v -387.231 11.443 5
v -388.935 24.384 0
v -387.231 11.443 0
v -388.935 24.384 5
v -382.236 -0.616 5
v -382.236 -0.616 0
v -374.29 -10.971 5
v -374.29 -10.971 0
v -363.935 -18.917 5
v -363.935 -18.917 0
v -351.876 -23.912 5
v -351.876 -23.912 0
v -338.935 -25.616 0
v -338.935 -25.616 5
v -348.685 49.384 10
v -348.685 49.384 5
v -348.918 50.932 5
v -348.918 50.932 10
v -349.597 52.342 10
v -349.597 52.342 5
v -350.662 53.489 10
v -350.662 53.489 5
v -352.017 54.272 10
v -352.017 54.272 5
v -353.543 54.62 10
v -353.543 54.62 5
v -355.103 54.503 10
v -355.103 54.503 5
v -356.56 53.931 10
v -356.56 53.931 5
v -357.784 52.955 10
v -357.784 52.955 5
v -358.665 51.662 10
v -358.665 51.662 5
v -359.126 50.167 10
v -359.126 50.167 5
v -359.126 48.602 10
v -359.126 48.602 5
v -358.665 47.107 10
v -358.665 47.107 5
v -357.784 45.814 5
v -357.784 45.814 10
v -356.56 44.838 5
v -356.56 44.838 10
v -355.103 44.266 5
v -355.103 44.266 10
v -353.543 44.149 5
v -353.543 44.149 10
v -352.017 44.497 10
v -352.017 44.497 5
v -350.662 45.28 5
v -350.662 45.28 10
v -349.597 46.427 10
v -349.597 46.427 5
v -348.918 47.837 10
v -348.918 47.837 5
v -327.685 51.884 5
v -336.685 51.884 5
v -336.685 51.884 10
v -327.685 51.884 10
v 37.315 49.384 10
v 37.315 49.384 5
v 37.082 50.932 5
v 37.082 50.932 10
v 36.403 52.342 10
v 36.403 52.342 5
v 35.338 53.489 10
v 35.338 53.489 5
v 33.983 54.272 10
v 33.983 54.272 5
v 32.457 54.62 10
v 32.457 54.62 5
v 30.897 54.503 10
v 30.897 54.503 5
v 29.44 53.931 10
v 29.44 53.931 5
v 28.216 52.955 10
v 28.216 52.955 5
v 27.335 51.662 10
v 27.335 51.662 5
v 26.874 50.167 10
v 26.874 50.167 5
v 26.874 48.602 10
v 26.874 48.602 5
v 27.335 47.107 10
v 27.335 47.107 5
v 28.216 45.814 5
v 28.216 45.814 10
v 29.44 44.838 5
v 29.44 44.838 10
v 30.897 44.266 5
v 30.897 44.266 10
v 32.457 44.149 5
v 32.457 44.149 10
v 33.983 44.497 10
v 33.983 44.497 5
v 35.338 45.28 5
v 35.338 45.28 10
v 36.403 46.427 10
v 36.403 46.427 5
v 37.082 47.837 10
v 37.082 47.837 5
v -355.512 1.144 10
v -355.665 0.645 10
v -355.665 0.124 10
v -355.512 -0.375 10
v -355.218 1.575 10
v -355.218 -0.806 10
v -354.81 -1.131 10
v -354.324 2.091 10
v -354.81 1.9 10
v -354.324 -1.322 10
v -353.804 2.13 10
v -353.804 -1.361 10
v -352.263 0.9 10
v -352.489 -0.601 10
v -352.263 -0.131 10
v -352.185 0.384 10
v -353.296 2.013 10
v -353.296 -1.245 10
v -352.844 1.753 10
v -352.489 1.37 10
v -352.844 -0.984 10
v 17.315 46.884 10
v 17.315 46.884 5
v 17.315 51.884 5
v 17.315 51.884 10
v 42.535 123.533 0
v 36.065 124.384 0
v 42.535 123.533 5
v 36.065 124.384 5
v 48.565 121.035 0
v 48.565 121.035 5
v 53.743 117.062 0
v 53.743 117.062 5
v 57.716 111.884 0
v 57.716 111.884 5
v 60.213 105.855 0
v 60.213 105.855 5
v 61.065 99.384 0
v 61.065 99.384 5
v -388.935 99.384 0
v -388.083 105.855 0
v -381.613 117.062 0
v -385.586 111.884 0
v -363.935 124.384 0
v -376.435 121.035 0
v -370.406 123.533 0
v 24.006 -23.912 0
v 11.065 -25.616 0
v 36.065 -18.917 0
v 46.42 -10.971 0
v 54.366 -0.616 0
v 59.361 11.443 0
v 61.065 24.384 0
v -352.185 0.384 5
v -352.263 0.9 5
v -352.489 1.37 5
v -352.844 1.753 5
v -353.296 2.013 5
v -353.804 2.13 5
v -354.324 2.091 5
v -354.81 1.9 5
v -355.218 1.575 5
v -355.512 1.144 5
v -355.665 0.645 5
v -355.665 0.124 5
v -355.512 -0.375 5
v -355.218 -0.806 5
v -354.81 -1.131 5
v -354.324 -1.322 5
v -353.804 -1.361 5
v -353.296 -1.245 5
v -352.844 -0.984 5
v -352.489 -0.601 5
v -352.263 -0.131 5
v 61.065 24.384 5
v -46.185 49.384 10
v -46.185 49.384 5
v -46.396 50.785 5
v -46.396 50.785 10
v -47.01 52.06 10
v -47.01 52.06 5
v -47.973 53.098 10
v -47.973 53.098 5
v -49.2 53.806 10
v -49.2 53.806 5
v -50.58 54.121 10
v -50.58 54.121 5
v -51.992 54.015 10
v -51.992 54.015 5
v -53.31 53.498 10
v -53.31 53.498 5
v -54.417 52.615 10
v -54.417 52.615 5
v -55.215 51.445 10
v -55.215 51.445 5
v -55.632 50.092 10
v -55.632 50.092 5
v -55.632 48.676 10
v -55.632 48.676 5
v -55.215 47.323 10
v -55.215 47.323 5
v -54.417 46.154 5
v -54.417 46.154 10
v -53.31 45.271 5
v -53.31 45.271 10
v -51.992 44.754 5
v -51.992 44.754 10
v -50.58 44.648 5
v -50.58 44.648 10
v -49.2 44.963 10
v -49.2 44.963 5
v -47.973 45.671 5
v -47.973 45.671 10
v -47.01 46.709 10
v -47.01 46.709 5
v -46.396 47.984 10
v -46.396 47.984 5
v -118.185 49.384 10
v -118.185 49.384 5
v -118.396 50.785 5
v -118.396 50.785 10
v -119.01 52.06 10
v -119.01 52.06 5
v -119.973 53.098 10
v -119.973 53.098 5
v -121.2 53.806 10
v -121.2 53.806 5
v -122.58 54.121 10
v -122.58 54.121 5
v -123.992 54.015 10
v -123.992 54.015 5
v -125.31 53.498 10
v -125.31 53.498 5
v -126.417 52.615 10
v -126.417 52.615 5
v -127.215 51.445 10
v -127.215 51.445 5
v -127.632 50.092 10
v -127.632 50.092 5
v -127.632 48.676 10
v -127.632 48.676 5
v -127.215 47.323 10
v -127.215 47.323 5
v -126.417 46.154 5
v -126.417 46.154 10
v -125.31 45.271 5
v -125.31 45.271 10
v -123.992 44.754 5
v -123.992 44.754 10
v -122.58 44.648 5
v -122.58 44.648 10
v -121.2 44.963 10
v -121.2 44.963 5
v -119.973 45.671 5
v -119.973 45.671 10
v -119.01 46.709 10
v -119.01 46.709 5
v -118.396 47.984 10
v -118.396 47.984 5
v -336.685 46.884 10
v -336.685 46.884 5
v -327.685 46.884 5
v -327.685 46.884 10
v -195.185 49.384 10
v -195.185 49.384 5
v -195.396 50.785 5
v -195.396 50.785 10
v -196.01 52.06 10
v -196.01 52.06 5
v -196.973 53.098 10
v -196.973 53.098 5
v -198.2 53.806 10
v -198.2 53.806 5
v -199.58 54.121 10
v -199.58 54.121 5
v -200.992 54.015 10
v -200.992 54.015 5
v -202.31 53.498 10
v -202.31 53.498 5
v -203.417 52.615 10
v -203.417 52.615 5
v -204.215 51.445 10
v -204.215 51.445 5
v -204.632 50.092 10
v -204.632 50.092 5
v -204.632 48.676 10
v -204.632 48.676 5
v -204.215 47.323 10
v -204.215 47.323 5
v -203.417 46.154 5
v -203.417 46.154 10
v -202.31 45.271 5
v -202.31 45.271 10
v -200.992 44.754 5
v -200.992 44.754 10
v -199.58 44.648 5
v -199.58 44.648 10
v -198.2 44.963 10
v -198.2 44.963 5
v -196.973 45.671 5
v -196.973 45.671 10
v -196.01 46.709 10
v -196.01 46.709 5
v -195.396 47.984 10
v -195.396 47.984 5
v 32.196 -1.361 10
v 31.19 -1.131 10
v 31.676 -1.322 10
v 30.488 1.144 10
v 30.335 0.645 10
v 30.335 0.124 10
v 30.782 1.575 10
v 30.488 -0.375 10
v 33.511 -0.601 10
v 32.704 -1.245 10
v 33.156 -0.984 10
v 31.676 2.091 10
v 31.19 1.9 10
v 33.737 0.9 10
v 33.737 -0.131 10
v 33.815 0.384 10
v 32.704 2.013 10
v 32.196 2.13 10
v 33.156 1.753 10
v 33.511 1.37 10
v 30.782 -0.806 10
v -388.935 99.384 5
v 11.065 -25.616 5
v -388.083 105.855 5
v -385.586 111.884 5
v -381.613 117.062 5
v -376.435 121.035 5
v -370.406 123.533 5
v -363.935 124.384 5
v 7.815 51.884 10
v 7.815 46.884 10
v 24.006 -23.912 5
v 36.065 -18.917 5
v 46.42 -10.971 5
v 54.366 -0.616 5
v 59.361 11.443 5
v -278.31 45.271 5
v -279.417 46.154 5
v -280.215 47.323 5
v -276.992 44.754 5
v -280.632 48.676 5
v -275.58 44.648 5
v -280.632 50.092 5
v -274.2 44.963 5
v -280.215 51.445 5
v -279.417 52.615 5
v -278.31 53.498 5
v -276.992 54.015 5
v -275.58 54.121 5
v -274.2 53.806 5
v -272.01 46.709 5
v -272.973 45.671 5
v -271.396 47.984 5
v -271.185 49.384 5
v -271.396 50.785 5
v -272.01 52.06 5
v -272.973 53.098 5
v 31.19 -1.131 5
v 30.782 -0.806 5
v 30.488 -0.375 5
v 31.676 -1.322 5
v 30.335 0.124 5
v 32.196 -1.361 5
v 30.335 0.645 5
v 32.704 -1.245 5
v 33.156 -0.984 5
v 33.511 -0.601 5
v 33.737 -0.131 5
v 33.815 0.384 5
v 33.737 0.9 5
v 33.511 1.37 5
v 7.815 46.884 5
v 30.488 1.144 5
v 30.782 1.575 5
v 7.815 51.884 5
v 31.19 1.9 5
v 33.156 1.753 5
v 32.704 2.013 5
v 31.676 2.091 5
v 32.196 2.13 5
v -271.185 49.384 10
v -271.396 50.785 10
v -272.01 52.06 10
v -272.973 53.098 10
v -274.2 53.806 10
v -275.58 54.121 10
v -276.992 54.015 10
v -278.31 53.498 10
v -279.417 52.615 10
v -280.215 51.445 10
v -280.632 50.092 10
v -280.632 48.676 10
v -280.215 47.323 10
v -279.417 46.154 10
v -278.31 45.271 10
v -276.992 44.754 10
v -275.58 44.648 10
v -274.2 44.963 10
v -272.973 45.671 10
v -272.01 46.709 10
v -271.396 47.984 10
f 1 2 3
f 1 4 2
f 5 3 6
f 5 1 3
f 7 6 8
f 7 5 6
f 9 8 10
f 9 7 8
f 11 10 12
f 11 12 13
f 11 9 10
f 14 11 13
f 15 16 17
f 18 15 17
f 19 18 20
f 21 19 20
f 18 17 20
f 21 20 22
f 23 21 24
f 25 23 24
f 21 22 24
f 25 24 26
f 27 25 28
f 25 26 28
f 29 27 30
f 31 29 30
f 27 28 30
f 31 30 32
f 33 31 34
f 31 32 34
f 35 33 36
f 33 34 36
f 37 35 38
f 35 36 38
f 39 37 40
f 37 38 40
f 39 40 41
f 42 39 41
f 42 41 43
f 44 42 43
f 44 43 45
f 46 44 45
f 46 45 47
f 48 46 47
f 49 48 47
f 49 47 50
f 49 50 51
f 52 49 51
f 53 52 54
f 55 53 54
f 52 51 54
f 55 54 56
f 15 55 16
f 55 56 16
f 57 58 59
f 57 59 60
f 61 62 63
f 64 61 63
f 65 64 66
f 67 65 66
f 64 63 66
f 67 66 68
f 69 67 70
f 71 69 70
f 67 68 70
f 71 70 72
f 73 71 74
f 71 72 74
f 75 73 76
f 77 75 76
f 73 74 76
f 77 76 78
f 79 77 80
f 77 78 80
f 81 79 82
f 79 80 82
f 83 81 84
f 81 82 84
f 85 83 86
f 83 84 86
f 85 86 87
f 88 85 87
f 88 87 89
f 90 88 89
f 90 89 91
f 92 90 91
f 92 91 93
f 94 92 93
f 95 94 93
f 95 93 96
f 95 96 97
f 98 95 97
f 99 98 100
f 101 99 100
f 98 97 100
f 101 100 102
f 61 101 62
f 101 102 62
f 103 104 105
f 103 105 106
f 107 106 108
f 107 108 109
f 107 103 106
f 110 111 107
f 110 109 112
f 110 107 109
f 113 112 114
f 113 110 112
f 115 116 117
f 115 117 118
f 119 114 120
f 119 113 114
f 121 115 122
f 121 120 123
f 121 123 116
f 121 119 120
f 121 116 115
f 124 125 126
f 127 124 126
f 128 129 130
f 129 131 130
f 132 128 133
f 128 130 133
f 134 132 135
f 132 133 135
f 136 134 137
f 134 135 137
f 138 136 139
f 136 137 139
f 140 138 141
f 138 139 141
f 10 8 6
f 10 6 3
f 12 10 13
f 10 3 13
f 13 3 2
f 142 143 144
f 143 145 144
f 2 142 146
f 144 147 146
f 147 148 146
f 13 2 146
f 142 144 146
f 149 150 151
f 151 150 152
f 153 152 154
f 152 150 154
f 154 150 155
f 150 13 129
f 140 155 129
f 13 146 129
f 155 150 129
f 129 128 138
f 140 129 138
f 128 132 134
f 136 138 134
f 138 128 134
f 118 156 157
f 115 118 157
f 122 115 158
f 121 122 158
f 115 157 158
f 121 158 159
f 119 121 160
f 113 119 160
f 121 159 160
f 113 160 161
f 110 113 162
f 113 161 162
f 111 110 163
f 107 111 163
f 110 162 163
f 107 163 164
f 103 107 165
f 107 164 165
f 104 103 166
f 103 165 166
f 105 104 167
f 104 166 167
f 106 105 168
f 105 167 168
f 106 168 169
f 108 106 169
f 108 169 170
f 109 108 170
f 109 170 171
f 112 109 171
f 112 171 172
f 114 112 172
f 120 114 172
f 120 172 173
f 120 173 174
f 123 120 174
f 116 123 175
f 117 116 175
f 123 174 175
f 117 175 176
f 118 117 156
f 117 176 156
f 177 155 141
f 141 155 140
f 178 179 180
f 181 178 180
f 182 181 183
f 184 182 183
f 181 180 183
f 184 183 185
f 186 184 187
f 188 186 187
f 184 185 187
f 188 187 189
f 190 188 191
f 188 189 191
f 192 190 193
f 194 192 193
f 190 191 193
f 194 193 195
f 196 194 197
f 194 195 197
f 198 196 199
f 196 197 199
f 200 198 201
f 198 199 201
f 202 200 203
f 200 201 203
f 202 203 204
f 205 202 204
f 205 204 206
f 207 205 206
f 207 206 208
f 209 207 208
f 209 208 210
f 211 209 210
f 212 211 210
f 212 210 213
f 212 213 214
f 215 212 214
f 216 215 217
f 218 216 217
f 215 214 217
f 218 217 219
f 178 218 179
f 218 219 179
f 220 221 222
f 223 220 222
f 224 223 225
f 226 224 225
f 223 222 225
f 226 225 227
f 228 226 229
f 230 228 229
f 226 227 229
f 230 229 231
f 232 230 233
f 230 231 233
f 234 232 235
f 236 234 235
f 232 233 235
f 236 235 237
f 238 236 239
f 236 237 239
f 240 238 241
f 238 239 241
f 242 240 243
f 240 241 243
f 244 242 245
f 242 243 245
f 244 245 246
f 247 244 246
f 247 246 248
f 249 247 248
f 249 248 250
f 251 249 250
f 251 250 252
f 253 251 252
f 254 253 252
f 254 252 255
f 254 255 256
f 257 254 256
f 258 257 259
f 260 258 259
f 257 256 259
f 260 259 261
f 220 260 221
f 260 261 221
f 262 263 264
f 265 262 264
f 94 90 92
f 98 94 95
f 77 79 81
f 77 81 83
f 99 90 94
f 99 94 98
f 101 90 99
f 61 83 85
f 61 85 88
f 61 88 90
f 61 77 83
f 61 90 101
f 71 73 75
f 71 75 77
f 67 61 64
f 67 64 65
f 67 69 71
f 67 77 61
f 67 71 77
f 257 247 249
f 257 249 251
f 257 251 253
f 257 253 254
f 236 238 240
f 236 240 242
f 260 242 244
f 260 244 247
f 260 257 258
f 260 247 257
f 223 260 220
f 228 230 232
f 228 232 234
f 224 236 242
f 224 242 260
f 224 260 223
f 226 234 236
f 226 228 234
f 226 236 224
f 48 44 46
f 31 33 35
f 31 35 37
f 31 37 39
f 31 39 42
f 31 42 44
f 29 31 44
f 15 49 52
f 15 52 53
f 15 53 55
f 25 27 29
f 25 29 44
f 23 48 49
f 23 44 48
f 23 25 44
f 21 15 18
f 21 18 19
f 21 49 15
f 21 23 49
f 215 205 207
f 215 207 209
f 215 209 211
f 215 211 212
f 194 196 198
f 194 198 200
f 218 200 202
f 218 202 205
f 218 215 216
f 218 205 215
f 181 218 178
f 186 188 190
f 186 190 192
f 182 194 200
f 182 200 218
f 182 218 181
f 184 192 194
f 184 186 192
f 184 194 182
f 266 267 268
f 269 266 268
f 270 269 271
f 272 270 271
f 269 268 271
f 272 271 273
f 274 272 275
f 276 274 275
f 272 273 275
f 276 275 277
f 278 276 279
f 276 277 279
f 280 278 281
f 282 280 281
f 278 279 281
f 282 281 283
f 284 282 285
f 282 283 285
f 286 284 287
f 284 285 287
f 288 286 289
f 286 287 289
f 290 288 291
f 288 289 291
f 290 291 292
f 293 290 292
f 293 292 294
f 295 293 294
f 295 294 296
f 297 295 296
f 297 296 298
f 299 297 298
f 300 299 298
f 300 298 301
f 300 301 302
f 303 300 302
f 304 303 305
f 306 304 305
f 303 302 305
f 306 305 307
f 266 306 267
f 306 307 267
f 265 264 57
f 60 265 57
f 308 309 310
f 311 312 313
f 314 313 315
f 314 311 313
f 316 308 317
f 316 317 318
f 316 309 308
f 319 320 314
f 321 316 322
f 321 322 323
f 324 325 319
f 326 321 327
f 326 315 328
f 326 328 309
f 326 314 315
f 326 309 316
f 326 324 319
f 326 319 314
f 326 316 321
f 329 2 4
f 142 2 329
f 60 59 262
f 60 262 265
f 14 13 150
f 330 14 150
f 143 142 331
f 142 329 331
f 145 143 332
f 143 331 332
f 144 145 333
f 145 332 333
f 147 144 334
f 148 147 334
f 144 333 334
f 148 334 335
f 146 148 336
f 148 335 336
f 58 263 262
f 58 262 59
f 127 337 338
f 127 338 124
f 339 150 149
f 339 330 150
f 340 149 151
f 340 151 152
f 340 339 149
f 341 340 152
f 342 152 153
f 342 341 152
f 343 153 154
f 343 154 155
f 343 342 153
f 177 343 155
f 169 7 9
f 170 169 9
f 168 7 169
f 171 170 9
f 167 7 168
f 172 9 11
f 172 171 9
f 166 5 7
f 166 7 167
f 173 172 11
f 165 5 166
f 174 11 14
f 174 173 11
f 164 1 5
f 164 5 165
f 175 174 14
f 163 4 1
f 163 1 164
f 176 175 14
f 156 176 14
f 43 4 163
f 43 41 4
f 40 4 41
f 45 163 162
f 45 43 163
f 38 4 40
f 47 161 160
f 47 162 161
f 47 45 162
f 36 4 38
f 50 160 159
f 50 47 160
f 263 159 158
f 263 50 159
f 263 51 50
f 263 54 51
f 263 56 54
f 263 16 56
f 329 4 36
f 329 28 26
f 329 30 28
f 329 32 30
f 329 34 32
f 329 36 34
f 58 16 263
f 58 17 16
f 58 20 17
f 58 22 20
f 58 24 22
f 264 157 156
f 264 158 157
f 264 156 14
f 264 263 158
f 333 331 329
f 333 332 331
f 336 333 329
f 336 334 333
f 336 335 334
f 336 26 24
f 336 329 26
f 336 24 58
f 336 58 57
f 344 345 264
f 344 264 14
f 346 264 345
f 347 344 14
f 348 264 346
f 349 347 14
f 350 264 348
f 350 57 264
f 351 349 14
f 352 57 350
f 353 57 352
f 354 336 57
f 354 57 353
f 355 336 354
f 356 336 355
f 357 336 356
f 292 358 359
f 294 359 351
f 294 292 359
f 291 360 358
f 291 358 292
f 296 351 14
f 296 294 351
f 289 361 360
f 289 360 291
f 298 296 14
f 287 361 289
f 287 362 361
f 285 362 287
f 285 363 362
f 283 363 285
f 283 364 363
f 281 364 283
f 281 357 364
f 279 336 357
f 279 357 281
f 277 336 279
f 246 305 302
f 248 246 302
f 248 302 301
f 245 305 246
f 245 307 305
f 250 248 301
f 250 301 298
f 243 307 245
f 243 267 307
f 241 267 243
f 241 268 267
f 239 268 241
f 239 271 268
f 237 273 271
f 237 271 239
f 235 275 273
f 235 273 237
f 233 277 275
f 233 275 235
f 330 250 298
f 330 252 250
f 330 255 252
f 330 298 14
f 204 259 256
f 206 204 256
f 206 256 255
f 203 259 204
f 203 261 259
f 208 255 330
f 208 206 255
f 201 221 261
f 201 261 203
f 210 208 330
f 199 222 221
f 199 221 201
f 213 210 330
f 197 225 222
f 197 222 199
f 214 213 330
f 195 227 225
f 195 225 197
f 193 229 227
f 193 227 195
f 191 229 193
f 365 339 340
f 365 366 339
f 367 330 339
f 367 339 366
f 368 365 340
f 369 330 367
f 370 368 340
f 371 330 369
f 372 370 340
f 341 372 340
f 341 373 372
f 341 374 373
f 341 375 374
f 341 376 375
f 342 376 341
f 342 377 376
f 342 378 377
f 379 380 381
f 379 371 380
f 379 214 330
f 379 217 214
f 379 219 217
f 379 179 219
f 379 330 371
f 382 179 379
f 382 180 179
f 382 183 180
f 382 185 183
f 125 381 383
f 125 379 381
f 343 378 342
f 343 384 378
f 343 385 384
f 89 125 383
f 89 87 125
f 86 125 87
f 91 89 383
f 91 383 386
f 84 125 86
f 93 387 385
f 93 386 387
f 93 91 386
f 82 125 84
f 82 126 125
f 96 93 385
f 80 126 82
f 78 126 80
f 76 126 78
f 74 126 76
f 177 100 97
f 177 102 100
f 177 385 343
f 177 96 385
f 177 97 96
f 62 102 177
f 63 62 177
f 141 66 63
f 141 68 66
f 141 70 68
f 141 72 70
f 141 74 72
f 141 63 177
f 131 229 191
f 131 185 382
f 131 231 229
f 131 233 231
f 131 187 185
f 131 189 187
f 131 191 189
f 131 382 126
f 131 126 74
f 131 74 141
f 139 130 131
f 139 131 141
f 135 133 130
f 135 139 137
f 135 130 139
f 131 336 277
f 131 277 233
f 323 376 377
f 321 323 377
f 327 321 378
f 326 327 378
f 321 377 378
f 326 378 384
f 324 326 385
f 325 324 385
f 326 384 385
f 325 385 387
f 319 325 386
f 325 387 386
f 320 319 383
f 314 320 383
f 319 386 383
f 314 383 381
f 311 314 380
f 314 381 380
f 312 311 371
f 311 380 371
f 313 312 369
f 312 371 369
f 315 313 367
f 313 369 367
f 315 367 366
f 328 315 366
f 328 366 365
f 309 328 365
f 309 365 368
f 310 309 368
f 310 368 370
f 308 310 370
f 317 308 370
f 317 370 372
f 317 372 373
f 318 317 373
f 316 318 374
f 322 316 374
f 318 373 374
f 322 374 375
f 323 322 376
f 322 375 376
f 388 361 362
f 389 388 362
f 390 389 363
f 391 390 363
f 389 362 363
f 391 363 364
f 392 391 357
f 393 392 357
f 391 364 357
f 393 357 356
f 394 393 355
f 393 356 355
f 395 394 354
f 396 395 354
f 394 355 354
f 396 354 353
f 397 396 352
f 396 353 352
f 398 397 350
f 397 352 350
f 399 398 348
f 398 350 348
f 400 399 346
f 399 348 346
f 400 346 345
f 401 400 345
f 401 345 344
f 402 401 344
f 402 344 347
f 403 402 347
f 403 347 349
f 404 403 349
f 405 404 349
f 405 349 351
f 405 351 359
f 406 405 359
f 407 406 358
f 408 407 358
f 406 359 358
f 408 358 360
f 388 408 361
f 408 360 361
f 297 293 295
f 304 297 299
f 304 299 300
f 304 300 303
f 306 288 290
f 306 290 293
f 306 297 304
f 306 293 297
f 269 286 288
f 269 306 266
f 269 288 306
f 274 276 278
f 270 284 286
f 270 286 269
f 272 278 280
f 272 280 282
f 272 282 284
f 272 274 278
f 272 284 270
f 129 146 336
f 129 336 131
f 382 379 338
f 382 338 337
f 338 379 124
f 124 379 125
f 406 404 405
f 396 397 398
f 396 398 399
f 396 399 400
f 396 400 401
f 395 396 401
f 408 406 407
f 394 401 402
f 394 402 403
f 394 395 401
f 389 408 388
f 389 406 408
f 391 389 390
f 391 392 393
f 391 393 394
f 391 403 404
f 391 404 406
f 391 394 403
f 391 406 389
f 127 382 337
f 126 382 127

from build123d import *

# Parameters (mm, degrees)
F0_W     = 450
F0_H     = 150
F1_DEPTH = 5
F2_W     = 9
F2_H     = 5
F2_R     = 5.25
F2_R_2   = 4.75
F2_W_2   = 9.5
F2_R_3   = 1.75
F3_DEPTH = 5
F4_R     = 25
F5_R     = 50


with BuildPart() as f1:
    # F0 (on Top) → F1 (new body)
    with BuildSketch(Plane.XY):
        with Locations((-163.935045, 49.38444)):
            Rectangle(F0_W, F0_H)
    extrude(amount=F1_DEPTH)

    # F2 (on face) → F3 (join)
    with BuildSketch(Plane.XY.offset(5)):
        with Locations((-332.185045, 49.38444)):
            Rectangle(F2_W, F2_H)
        with Locations((-353.935045, 49.38444)):
            Circle(F2_R)
        with Locations((-275.935045, 49.38444)):
            Circle(F2_R_2)
        with Locations((-199.935045, 49.38444)):
            Circle(F2_R_2)
        with Locations((-122.935045, 49.38444)):
            Circle(F2_R_2)
        with Locations((-50.935045, 49.38444)):
            Circle(F2_R_2)
        with Locations((32.064955, 49.38444)):
            Circle(F2_R)
        with Locations((12.564955, 49.38444)):
            Rectangle(F2_W_2, F2_H)
        with Locations((-353.935045, 0.38444)):
            Circle(F2_R_3)
        with Locations((32.064955, 0.38444)):
            Circle(F2_R_3)
    extrude(amount=F3_DEPTH)

    # F4
    f4_edges = [f1.edges().sort_by_distance(p)[0] for p in [
        (-388.935045, 124.38444, 2.5),
        (61.064955, 124.38444, 2.5),
    ]]
    fillet(f4_edges, radius=F4_R)

    # F5
    f5_edges = [f1.edges().sort_by_distance(p)[0] for p in [
        (-388.935045, -25.61556, 2.5),
        (61.064955, -25.61556, 2.5),
    ]]
    fillet(f5_edges, radius=F5_R)


solid = f1.part
